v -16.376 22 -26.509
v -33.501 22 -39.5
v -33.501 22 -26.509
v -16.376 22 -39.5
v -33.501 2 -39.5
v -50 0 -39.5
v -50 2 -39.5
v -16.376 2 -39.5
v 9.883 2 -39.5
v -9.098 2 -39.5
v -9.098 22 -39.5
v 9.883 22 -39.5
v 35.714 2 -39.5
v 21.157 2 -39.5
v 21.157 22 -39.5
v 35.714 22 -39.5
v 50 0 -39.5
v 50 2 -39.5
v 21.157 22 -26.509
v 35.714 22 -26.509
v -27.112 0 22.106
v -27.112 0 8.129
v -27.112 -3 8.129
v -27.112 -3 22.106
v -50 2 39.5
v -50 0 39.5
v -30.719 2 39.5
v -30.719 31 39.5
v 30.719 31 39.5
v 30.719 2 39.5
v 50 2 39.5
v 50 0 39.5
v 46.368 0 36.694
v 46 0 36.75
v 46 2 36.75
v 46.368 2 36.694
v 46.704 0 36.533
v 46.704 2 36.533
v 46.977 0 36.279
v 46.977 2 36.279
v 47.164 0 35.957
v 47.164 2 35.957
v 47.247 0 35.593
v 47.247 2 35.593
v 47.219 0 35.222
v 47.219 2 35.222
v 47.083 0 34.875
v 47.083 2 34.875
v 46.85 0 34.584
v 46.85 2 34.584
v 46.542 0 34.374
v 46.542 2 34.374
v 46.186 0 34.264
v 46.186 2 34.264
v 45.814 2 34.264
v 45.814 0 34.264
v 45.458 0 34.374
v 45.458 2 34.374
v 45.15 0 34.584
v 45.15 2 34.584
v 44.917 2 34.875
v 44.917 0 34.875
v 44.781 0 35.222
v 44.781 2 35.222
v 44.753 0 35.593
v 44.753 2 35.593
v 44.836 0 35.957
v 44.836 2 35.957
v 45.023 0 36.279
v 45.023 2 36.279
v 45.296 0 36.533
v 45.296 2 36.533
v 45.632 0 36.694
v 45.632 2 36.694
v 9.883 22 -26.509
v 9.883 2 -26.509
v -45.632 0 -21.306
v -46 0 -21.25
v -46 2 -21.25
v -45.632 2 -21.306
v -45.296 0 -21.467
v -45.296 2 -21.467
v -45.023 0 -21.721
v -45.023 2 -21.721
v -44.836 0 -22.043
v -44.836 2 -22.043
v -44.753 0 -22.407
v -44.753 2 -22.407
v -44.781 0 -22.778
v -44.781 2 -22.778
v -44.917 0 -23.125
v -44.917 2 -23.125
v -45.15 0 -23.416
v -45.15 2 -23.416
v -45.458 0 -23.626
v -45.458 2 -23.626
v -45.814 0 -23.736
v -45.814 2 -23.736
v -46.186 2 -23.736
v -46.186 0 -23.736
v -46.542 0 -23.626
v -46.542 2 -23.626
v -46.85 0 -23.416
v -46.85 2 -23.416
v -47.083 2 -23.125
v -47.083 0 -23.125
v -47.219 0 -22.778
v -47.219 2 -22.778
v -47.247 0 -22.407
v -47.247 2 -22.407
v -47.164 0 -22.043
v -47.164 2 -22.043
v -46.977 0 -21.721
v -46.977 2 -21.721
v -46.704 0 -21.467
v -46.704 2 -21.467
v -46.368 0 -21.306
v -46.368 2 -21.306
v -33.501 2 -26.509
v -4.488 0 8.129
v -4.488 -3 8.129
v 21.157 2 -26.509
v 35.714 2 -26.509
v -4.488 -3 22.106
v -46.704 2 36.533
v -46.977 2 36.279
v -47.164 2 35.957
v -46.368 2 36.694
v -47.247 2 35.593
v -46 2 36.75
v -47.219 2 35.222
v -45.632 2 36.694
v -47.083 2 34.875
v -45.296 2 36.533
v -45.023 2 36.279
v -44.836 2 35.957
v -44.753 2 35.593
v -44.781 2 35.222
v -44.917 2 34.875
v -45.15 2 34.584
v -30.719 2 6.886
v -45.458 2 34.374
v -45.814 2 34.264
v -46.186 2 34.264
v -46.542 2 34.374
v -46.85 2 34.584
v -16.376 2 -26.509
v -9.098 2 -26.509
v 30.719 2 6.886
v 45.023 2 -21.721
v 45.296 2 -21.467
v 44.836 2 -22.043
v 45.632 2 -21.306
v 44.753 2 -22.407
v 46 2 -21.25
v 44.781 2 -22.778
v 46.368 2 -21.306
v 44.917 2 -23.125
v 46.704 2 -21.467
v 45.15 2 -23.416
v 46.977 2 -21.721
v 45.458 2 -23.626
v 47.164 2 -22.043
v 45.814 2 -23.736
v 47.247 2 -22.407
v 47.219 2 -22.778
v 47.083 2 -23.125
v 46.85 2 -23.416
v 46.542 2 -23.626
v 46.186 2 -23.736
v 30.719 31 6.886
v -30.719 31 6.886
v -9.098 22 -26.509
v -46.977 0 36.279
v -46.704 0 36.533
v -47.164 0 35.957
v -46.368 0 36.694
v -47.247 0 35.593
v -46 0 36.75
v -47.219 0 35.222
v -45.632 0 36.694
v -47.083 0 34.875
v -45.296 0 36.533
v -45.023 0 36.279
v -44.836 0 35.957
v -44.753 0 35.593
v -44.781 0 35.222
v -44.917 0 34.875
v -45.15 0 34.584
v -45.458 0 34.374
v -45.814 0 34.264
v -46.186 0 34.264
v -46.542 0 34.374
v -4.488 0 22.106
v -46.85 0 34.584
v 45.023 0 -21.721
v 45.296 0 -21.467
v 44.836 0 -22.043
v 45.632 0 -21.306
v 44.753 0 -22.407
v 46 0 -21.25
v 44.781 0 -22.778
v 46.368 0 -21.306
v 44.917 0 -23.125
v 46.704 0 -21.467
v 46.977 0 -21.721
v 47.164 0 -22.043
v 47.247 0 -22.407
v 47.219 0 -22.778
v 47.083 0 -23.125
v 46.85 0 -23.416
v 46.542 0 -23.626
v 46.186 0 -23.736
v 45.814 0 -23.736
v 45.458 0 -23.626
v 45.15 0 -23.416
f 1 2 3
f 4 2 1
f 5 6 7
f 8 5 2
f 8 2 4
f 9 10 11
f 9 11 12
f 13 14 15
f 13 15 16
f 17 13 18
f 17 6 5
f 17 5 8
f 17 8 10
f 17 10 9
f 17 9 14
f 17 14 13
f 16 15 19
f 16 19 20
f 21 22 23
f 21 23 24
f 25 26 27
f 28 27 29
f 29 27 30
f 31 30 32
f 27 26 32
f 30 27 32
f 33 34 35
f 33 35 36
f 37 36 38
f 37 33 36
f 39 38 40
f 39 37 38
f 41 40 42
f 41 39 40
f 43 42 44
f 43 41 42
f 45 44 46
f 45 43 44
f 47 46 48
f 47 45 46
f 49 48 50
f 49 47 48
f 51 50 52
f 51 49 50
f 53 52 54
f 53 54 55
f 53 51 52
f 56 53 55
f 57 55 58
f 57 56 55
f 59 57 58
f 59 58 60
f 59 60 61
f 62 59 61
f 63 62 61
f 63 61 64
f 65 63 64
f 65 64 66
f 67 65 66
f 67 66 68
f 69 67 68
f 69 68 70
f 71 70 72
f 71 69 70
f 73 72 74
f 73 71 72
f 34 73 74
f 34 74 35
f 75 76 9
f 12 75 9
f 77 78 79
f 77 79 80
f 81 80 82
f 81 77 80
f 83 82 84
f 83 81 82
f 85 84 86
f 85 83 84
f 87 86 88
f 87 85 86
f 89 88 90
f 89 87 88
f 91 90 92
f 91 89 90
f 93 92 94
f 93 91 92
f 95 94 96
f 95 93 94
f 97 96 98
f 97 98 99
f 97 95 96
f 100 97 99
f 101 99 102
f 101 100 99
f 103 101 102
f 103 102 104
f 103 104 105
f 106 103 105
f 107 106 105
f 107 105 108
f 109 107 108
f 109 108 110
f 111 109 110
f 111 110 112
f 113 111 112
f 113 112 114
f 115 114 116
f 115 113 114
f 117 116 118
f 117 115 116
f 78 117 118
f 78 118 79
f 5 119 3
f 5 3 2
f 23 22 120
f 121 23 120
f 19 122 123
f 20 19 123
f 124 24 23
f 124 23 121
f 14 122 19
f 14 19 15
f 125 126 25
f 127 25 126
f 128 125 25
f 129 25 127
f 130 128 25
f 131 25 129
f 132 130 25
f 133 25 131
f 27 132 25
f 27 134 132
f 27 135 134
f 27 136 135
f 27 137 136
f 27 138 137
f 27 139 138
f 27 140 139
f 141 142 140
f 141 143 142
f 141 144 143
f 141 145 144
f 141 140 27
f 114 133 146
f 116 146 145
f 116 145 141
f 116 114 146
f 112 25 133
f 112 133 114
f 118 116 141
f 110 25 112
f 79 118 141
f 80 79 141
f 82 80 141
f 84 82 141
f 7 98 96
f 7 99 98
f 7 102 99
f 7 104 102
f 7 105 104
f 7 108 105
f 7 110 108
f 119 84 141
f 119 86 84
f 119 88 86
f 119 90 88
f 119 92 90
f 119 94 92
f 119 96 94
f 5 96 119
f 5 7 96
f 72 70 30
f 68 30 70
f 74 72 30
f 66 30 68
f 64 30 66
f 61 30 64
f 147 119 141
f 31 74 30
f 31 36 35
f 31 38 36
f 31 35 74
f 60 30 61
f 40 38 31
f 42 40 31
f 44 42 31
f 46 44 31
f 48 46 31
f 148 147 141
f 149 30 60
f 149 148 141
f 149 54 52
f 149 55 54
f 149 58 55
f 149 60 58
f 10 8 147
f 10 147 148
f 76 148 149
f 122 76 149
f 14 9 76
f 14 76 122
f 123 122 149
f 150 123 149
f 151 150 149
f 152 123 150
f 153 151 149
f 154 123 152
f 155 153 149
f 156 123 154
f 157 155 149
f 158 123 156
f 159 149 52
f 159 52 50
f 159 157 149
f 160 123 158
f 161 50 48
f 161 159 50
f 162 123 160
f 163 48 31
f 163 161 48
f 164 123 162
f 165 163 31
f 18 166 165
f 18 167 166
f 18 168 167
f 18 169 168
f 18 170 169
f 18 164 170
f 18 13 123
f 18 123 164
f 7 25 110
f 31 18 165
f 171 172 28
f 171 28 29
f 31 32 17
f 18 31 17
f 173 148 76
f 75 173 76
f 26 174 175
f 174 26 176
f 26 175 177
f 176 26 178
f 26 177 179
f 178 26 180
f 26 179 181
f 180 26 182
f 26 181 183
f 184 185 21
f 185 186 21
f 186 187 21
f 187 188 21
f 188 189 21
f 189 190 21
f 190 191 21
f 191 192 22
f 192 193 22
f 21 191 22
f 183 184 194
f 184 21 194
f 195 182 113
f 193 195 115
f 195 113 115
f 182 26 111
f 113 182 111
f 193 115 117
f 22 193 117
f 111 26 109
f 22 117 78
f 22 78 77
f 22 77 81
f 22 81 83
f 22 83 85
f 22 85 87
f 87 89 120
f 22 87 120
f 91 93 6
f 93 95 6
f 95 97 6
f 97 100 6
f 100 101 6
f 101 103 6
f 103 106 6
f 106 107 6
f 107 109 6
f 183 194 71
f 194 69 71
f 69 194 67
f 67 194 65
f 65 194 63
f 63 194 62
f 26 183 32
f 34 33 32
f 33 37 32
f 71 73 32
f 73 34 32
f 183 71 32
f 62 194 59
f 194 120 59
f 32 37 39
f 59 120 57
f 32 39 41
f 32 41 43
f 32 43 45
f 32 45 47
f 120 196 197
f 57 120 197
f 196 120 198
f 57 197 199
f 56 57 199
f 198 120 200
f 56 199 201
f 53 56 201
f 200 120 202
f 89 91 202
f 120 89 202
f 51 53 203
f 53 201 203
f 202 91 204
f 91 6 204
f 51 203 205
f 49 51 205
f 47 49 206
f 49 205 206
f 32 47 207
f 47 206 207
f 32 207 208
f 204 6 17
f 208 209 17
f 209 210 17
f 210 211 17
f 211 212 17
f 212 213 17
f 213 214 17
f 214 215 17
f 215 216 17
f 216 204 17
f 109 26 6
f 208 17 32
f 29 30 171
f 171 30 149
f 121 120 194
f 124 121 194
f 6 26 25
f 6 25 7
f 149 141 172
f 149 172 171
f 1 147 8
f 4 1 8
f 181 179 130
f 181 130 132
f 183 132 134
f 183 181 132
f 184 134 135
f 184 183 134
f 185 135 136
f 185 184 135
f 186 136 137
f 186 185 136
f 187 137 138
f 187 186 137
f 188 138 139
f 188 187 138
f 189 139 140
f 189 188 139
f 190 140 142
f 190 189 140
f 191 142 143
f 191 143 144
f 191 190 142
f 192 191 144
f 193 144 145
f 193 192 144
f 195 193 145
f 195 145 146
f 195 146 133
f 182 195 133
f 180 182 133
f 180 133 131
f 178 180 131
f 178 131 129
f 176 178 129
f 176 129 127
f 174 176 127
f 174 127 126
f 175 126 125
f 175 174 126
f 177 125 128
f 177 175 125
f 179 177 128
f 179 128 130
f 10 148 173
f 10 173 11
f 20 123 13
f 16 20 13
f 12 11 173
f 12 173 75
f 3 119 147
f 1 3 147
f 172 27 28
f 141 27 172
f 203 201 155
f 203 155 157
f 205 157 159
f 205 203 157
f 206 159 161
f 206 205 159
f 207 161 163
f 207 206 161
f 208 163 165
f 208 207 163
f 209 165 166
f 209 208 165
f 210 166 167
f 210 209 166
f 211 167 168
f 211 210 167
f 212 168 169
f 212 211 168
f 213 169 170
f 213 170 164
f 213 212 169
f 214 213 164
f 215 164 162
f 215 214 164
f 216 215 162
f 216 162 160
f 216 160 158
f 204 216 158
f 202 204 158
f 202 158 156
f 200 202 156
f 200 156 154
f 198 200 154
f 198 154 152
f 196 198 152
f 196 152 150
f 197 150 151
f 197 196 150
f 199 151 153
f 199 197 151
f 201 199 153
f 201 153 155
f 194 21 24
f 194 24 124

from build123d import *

# Parameters (mm, degrees)
SKETCH_1_W      = 100
SKETCH_1_H      = 79
SKETCH_1_R      = 1.25
EXTRUDE_1_DEPTH = 2
SKETCH_2_W      = 22.62402863
SKETCH_2_H      = 13.977148577
EXTRUDE_2_DEPTH = 3
SKETCH_3_W      = 61.437231596
SKETCH_3_H      = 32.614177876
EXTRUDE_3_DEPTH = 29
SKETCH_4_W      = 17.125360724
SKETCH_4_H      = 12.991368713
SKETCH_4_W_2    = 18.980608136
SKETCH_4_W_3    = 14.556556615
EXTRUDE_4_DEPTH = 20


with BuildPart() as part:
    # 草图1 → 凸台-拉伸1 (new body)
    with BuildSketch(Plane(origin=(0, 0, 0), x_dir=(1, 0, 0), z_dir=(0, 1, 0))):
        Rectangle(SKETCH_1_W, SKETCH_1_H)
        with Locations(Location((-46, 22.5, 0), (0, 0, 270))):
            Circle(SKETCH_1_R, mode=Mode.SUBTRACT)
        with Locations(Location((46, 22.5, 0), (0, 0, 270))):
            Circle(SKETCH_1_R, mode=Mode.SUBTRACT)
        with Locations(Location((46, -35.5, 0), (0, 0, 270))):
            Circle(SKETCH_1_R, mode=Mode.SUBTRACT)
        with Locations(Location((-46, -35.5, 0), (0, 0, 270))):
            Circle(SKETCH_1_R, mode=Mode.SUBTRACT)
    extrude(amount=EXTRUDE_1_DEPTH)

    # 草图2 → 凸台-拉伸2 (add)
    with BuildSketch(Plane.XZ):
        with Locations((-15.800196743, 15.117537052)):
            Rectangle(SKETCH_2_W, SKETCH_2_H)
    extrude(amount=EXTRUDE_2_DEPTH)

    # 草图3 → 凸台-拉伸3 (add)
    with BuildSketch(Plane(origin=(0, 2, 0), x_dir=(1, 0, 0), z_dir=(0, 1, 0))):
        with Locations((0, -23.192911062)):
            Rectangle(SKETCH_3_W, SKETCH_3_H)
    extrude(amount=EXTRUDE_3_DEPTH)

    # 草图4 → 凸台-拉伸4 (add)
    with BuildSketch(Plane(origin=(0, 2, 0), x_dir=(1, 0, 0), z_dir=(0, 1, 0))):
        with Locations((-24.938806554, 33.004315644)):
            Rectangle(SKETCH_4_W, SKETCH_4_H)
        with Locations((0.392456183, 33.004315644)):
            Rectangle(SKETCH_4_W_2, SKETCH_4_H)
        with Locations((28.435234369, 33.004315644)):
            Rectangle(SKETCH_4_W_3, SKETCH_4_H)
    extrude(amount=EXTRUDE_4_DEPTH)


solid = part.part
